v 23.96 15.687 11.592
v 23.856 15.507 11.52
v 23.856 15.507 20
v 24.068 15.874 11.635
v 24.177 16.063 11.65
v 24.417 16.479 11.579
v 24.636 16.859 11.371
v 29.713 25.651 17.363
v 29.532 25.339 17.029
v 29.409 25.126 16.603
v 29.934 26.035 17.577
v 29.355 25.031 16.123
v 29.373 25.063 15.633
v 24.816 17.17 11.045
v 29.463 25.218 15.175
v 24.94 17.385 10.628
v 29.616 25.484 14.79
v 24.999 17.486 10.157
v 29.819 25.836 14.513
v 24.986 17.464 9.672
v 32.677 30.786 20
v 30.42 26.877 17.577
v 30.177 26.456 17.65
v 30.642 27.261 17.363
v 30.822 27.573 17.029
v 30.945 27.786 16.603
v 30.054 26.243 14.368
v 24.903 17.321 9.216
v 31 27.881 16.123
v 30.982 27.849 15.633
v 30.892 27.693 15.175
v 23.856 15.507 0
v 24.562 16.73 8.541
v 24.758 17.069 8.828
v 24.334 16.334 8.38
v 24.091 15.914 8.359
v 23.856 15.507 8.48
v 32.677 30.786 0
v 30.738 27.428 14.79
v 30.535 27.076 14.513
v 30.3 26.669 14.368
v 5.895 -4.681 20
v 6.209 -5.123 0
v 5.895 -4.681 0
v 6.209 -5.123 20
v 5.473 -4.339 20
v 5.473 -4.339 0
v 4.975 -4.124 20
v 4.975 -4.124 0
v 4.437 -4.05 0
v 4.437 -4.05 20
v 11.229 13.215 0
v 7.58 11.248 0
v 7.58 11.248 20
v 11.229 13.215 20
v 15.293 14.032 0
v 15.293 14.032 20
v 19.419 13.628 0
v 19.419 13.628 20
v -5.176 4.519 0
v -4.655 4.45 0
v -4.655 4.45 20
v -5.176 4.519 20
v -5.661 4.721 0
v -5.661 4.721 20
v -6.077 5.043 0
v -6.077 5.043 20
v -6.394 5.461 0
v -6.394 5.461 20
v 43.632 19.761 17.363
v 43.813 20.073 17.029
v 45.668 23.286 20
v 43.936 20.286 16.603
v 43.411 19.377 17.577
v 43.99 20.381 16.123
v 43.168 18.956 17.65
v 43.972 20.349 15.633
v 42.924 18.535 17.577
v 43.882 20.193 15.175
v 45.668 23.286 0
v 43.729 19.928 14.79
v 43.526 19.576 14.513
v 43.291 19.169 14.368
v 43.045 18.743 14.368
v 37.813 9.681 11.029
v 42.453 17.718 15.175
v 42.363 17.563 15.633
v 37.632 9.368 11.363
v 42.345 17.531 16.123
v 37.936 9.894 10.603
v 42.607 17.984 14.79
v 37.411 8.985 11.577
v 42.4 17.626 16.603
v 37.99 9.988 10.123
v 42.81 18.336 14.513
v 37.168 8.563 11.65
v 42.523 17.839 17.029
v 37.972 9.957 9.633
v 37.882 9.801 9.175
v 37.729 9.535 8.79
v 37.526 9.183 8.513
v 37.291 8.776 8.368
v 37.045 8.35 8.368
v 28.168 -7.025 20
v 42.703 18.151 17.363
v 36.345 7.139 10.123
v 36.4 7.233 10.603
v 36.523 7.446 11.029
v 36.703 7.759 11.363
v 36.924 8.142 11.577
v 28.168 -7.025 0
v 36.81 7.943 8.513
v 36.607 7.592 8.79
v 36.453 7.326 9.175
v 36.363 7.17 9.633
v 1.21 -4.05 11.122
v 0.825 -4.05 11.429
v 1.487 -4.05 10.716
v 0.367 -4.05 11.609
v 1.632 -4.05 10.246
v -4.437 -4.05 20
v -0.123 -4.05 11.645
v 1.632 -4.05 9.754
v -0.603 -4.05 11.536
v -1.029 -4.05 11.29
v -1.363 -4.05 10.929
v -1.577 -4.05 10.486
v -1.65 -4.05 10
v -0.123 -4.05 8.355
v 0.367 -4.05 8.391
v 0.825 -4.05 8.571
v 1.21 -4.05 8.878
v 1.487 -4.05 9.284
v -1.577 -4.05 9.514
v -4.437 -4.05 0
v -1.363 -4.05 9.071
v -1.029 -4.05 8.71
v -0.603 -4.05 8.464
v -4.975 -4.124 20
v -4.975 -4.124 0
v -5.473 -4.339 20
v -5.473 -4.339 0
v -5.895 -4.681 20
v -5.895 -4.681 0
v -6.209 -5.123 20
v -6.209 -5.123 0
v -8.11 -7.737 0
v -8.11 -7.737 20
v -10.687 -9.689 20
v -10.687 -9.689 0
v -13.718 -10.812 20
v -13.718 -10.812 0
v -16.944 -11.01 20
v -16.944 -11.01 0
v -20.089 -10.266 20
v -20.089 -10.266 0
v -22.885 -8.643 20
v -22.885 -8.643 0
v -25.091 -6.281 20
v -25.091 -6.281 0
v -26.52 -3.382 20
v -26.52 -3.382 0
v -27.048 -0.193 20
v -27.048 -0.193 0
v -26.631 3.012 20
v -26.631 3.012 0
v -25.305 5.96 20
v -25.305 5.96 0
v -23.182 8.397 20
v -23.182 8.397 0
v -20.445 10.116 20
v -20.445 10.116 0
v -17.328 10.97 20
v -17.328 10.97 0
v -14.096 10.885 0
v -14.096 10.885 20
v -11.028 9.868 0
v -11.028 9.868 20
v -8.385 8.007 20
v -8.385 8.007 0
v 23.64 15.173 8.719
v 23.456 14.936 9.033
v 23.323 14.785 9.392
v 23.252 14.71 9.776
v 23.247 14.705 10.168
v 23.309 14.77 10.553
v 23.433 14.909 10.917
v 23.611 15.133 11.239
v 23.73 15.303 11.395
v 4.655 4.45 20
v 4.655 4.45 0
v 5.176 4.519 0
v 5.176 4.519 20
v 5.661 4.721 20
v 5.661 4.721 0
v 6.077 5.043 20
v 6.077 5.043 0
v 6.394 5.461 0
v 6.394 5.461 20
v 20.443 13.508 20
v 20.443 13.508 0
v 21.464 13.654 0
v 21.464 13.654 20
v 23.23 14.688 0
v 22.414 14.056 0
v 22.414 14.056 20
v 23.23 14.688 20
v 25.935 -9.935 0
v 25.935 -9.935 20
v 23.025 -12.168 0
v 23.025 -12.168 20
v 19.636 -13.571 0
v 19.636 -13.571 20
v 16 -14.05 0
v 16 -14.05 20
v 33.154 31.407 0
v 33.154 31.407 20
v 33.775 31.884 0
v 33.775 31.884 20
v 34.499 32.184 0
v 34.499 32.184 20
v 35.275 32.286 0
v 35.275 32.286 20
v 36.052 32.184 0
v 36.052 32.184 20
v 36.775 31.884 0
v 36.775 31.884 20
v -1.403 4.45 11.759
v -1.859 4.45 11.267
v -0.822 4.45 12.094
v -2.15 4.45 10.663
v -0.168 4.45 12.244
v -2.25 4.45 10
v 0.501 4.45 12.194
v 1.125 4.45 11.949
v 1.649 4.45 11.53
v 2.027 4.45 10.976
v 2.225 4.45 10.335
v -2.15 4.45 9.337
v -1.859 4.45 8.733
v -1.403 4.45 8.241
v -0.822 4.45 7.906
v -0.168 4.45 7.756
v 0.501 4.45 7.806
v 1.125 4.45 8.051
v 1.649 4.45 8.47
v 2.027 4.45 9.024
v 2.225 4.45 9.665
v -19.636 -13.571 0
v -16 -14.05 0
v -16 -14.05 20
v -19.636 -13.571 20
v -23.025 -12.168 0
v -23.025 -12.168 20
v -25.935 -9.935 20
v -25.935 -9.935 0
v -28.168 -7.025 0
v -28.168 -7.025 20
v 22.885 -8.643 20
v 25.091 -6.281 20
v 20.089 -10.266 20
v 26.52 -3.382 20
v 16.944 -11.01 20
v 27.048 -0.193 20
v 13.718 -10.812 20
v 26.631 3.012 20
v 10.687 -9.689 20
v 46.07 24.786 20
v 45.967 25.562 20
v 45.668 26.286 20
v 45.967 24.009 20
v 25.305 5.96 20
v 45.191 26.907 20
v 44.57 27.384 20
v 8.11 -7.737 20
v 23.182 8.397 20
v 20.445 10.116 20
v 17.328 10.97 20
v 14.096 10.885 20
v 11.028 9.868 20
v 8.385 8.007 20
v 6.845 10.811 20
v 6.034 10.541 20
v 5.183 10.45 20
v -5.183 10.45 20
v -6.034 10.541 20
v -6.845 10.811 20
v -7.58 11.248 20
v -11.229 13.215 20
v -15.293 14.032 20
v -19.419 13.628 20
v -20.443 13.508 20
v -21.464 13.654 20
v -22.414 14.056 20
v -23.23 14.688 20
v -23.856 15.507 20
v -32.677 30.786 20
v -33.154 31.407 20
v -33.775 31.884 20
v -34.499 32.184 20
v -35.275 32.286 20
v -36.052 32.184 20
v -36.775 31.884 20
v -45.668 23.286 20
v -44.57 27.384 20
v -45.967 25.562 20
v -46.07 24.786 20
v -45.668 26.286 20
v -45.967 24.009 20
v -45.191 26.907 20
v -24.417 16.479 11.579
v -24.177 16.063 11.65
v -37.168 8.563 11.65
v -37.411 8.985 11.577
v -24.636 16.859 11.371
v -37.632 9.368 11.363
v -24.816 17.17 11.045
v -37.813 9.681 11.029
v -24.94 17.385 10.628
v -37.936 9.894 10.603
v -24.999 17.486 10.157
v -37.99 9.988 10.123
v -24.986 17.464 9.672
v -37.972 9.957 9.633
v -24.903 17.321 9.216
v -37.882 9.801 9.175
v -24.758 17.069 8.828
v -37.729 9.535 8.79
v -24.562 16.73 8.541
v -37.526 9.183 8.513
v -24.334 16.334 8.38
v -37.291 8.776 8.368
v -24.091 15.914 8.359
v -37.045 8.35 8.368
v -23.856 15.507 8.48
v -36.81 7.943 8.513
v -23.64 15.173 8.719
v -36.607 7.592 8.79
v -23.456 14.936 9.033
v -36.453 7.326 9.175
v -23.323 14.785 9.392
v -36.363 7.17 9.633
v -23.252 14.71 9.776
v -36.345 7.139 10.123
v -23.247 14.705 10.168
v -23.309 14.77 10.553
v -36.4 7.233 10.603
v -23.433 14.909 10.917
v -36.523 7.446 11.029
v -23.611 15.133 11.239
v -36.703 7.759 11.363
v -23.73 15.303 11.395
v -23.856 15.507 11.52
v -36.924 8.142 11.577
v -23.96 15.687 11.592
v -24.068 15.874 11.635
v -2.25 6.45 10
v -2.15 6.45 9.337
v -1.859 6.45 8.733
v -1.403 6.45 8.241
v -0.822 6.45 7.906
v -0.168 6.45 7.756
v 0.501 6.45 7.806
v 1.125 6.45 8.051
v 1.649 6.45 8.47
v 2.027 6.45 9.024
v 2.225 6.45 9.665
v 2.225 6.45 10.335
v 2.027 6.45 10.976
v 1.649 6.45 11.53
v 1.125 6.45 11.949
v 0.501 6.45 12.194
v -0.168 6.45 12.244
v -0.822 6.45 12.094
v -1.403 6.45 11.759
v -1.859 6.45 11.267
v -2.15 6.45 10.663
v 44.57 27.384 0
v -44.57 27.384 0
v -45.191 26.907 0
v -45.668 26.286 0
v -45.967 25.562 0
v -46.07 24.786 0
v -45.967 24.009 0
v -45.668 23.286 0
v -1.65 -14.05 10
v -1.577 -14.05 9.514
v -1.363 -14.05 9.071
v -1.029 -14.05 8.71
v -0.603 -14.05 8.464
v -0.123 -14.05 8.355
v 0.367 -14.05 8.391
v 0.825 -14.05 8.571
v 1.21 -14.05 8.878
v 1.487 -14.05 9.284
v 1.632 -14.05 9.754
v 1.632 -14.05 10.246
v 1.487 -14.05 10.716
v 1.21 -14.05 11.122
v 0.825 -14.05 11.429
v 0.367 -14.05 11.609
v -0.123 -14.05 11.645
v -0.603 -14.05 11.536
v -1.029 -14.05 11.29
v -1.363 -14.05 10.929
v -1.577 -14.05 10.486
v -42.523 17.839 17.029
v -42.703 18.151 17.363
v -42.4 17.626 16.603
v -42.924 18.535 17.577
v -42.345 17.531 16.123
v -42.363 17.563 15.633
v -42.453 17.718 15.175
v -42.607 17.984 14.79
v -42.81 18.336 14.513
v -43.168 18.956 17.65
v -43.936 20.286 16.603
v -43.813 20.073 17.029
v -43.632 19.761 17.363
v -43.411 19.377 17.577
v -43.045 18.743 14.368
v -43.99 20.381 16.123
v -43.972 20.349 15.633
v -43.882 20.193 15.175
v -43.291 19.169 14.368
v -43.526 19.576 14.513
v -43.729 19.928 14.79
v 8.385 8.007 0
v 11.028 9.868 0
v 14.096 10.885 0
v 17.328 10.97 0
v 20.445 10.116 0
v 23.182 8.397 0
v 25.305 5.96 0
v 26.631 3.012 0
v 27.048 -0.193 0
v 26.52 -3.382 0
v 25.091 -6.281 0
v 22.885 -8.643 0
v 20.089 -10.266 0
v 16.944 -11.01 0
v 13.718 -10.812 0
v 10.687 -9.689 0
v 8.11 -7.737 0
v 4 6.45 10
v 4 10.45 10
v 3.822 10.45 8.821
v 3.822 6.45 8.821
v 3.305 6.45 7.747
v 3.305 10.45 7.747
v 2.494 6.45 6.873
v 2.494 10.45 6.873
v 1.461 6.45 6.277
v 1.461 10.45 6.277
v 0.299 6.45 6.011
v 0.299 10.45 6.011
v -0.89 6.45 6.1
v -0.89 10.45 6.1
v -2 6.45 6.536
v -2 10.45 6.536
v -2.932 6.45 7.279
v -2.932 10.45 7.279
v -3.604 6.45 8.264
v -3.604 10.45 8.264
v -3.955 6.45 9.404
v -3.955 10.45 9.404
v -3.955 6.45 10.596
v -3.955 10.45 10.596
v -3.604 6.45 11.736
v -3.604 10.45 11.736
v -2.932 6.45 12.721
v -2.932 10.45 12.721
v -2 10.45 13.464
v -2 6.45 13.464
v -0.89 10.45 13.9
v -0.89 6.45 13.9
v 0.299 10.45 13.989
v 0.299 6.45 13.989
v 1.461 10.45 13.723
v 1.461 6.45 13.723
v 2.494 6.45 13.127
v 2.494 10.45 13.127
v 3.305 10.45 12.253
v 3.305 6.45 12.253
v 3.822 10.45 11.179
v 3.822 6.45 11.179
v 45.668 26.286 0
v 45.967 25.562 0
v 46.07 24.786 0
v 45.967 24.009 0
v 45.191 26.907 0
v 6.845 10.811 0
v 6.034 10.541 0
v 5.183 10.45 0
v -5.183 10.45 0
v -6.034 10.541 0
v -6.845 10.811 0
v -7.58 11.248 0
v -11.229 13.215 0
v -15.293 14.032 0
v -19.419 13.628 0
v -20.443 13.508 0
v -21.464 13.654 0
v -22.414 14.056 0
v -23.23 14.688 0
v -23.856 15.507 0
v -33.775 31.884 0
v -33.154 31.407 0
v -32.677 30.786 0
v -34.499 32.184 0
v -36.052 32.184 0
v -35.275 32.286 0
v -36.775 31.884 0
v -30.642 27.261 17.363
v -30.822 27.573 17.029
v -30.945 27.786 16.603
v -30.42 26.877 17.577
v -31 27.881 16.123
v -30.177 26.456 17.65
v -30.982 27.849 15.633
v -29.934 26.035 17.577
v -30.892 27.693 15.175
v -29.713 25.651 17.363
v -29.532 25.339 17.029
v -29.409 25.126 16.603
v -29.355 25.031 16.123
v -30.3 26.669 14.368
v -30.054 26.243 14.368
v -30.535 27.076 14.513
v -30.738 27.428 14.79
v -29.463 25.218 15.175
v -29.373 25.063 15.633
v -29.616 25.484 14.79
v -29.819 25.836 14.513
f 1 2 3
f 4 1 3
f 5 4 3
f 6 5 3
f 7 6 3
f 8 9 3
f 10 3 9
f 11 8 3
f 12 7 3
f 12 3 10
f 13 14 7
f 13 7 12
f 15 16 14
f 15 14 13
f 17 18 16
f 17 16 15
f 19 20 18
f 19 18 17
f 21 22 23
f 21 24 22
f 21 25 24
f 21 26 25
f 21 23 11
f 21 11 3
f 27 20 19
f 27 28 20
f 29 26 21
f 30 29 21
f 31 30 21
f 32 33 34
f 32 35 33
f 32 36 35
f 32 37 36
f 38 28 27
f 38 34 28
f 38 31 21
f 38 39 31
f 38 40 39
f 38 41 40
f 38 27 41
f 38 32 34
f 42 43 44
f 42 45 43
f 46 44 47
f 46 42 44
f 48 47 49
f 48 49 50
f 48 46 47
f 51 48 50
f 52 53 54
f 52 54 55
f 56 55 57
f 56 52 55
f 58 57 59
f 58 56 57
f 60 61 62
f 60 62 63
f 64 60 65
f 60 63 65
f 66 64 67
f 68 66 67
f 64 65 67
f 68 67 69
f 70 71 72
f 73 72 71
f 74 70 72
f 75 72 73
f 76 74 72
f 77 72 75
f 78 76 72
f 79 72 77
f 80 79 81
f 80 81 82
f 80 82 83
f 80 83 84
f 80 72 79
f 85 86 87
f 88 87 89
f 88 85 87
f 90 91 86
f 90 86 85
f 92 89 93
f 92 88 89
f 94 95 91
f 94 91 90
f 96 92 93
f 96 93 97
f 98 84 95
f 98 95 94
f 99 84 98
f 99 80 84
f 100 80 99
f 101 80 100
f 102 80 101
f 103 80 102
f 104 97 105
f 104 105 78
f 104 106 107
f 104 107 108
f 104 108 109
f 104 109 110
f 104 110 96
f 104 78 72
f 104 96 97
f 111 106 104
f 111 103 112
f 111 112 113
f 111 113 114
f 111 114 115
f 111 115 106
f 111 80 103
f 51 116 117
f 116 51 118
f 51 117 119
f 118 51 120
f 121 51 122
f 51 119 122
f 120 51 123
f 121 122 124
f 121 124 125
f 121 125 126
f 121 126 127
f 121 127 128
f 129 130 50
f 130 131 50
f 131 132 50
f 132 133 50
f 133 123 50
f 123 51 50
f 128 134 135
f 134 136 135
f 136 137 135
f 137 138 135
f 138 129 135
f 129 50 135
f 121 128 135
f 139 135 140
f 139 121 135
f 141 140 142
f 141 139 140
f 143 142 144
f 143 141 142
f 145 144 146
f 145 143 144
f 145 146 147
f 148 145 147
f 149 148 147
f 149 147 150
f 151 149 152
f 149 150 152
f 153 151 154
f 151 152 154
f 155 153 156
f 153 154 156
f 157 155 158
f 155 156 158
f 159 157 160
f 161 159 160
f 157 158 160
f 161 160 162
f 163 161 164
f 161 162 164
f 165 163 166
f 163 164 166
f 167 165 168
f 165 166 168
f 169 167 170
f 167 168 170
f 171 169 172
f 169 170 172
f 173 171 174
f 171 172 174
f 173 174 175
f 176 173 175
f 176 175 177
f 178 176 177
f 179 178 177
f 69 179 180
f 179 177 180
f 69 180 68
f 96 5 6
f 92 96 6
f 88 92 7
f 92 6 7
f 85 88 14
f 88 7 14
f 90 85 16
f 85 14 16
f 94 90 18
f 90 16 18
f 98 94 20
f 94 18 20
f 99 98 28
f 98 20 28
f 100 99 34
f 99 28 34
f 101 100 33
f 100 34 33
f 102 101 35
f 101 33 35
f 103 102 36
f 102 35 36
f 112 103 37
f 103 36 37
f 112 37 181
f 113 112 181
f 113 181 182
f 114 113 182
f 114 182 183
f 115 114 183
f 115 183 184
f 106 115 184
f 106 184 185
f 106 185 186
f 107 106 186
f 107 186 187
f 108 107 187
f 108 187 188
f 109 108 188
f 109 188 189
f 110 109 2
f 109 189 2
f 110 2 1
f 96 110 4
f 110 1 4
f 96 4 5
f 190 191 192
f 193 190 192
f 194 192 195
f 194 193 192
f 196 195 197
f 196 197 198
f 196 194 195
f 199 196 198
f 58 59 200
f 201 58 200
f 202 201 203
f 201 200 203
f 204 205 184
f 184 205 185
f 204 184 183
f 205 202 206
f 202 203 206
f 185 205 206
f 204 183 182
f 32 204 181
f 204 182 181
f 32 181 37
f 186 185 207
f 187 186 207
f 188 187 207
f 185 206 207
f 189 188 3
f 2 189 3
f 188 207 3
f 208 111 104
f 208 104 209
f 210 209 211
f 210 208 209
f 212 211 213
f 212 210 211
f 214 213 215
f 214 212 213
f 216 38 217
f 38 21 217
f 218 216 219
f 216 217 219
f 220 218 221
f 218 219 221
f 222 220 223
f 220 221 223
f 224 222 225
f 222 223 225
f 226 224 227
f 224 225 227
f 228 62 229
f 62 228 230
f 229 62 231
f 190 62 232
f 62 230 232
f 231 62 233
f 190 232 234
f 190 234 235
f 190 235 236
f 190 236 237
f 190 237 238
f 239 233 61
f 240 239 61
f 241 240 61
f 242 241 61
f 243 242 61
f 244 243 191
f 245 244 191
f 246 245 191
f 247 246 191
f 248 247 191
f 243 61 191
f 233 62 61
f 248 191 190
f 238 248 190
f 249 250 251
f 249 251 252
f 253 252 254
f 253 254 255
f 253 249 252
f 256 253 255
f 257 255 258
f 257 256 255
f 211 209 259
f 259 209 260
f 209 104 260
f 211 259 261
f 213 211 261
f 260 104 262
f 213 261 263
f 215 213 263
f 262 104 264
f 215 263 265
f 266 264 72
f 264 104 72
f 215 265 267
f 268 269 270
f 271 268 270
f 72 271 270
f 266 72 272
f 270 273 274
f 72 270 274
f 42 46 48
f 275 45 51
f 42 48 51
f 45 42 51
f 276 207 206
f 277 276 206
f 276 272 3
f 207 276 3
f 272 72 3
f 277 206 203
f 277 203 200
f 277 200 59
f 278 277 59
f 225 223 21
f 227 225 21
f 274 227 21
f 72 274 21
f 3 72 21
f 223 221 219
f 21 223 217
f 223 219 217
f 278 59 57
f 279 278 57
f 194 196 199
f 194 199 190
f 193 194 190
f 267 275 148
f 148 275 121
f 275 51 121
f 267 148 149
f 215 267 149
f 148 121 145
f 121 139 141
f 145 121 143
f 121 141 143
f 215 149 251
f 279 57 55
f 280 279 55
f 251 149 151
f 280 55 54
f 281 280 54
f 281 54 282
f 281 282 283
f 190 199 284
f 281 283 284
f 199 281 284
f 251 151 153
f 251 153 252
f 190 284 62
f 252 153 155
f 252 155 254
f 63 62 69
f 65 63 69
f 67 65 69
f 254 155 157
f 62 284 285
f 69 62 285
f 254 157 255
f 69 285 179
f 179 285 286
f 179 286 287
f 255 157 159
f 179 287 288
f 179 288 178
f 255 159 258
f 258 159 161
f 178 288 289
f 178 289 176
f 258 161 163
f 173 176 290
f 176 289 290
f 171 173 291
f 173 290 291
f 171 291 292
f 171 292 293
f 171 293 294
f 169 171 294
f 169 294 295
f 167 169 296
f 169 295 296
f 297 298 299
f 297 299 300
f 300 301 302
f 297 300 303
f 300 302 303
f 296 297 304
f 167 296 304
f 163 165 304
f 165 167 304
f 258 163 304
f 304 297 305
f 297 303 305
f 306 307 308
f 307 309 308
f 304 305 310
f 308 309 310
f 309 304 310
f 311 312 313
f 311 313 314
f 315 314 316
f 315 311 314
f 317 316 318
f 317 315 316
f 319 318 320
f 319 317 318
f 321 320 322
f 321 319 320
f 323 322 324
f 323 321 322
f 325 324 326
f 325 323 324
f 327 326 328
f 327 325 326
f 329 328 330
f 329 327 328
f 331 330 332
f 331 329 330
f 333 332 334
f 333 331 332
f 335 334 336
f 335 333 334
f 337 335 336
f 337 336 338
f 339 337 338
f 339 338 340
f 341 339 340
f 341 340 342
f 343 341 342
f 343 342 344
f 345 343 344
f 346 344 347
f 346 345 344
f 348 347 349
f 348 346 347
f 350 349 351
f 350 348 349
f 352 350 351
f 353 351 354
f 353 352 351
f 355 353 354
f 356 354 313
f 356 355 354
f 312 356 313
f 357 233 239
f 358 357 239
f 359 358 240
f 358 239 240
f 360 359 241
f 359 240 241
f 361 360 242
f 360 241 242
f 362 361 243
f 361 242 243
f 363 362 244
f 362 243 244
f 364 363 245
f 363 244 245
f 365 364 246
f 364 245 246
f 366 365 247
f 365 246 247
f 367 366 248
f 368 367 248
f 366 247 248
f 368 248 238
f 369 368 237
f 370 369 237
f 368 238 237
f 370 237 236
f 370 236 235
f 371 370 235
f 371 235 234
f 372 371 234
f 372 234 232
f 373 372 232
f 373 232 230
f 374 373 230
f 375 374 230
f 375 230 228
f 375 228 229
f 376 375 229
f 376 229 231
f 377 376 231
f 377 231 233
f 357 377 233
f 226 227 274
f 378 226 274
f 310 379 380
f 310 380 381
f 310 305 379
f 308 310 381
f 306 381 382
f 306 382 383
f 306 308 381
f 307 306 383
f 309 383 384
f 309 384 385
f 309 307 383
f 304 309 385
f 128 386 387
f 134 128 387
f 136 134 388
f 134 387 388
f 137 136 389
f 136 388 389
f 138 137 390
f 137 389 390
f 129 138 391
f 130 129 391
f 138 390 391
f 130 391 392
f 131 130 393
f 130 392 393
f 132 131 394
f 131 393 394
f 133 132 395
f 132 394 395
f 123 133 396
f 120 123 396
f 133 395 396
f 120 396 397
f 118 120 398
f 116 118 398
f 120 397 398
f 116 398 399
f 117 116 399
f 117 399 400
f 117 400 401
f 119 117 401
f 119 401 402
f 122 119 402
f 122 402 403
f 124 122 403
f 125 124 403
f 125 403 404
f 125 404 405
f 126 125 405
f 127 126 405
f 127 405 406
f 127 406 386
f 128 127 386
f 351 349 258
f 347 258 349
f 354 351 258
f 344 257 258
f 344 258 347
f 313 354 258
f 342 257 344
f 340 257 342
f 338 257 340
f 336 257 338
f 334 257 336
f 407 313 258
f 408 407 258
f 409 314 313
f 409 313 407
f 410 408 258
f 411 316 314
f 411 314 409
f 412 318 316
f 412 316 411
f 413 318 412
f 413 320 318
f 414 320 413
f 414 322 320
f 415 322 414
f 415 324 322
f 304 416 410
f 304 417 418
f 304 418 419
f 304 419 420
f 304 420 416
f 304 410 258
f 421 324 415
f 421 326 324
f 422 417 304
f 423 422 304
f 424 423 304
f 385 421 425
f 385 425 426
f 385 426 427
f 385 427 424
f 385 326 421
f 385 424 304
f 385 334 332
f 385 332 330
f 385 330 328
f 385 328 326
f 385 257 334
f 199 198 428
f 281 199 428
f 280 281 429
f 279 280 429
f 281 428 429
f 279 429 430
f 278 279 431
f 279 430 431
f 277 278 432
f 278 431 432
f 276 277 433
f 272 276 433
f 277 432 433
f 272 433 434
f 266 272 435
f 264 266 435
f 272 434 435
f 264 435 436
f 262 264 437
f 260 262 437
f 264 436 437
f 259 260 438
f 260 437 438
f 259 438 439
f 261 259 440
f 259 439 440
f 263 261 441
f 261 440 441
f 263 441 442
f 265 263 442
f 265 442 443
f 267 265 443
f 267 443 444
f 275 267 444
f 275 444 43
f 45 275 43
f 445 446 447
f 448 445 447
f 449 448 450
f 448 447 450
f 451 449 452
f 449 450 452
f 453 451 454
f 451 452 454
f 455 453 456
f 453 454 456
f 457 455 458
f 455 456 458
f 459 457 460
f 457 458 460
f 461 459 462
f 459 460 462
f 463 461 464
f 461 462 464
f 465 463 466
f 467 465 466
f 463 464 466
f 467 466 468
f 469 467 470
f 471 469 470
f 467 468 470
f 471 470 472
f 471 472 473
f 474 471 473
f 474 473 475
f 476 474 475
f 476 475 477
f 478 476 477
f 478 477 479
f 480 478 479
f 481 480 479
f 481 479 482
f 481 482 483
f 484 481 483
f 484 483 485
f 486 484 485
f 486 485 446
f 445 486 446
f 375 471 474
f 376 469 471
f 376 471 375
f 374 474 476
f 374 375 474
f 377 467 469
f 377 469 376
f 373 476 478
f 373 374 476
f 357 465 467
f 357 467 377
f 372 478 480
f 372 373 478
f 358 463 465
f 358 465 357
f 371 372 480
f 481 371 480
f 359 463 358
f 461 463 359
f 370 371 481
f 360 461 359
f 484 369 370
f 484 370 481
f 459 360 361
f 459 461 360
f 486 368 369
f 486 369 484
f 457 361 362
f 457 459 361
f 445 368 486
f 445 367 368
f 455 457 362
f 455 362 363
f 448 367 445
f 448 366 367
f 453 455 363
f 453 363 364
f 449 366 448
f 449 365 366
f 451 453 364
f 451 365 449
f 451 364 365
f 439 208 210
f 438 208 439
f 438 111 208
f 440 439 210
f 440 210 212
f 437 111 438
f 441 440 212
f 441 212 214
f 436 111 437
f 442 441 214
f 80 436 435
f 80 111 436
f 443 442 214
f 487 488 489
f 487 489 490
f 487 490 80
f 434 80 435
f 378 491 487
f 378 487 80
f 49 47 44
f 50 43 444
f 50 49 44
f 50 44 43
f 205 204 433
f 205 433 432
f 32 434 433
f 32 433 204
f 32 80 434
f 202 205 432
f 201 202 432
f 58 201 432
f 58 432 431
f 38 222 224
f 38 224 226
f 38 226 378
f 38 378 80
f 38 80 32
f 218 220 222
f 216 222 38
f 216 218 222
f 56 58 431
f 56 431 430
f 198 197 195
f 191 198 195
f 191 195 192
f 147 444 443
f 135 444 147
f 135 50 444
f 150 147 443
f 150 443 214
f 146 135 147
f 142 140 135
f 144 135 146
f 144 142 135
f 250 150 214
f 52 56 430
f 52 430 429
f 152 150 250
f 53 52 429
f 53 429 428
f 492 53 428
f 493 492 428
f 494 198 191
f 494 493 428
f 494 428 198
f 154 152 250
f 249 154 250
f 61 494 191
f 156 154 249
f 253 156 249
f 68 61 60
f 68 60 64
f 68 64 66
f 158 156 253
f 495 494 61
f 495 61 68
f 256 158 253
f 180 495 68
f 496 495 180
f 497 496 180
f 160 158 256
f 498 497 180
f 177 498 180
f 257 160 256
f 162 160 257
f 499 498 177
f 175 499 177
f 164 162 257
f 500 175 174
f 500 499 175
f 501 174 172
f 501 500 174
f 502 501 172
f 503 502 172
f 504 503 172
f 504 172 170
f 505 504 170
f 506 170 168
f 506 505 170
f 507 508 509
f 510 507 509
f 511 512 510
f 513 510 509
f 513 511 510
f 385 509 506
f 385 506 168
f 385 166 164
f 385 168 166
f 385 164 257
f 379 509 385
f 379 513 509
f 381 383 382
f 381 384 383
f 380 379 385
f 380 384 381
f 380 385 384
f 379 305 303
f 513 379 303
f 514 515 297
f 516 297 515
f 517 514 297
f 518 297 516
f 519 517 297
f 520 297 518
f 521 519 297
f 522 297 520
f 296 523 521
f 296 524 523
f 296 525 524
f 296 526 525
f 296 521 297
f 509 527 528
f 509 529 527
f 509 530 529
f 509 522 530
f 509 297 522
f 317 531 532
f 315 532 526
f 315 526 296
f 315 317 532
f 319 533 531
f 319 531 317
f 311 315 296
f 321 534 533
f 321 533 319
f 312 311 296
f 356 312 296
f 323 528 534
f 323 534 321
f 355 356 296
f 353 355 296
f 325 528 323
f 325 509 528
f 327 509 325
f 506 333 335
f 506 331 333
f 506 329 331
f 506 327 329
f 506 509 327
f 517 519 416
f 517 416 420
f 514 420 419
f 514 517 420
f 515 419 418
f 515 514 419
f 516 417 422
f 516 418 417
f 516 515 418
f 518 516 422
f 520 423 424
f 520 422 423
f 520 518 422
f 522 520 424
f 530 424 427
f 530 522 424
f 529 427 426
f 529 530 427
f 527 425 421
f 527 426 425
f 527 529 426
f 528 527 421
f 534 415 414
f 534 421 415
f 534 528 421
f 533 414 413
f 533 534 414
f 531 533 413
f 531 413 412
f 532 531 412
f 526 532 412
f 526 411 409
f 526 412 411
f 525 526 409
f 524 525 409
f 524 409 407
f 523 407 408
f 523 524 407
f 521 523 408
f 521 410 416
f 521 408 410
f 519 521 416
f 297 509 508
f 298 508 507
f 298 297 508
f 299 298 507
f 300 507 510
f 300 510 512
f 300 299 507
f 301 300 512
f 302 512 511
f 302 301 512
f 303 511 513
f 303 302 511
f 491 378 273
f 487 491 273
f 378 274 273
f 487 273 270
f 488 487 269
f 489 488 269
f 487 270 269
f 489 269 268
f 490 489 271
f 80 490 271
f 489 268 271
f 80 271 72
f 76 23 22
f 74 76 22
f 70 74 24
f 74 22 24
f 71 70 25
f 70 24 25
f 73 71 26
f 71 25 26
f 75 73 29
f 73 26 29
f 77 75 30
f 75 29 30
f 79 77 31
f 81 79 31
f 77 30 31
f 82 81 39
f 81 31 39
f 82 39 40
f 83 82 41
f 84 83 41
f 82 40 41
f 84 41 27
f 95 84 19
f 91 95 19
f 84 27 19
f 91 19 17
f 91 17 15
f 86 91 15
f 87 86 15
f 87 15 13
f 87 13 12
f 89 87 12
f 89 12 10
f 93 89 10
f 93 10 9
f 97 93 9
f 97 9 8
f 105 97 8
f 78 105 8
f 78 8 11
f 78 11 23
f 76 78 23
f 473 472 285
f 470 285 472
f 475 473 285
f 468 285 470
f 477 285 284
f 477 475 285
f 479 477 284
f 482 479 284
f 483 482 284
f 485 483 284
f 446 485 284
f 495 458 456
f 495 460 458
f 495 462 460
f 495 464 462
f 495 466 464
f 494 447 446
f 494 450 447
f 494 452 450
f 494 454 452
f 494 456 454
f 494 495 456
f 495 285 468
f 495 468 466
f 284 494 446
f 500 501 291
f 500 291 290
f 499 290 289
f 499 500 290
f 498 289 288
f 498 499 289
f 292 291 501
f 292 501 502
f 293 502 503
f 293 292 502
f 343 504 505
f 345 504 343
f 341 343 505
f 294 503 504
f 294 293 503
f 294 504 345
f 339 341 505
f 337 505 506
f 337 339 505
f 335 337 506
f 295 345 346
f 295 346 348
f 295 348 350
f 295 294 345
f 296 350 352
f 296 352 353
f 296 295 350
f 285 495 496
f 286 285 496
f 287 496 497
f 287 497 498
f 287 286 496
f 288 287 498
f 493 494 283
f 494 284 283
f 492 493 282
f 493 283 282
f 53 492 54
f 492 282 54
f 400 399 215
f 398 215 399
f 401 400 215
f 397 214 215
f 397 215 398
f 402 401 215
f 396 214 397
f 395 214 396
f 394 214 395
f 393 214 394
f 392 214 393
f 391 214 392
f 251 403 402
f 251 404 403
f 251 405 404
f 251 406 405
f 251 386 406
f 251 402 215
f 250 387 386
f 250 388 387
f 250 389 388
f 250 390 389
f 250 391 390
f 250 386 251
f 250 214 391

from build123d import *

# Parameters (mm, degrees)
EXTRUDE_2_DEPTH             = 20
HOLE_WIZARD_M41_D           = 4.5
HOLE_WIZARD_M41_DEPTH       = 6
HOLE_WIZARD_M41_CBORE_D     = 8
HOLE_WIZARD_M41_CBORE_DEPTH = 4
M4X0_71_D                   = 3.3
FILLET_1_R                  = 2
FILLET_2_R                  = 4
M4X0_72_D                   = 3.3
FILLET_3_R                  = 3


with BuildPart() as part:
    # Эскиз1 → Бобышка-Вытянуть2 (new body)
    with BuildSketch(Plane.XY):
        with BuildLine():
            Line((-6.608514495, 10.45), (6.608514495, 10.45))
            ThreePointArc((6.608514495, 10.45), (14.066074726, 13.916265053), (22.186198751, 12.614810542))
            Line((22.186198751, 12.614810542), (34.177275866, 33.383965344))
            Line((34.177275866, 33.383965344), (47.167656923, 25.883965344))
            Line((47.167656923, 25.883965344), (28.167656923, -7.025))
            ThreePointArc((28.167656923, -7.025), (23.025, -12.167656923), (16, -14.05))
            Line((16, -14.05), (-16, -14.05))
            ThreePointArc((-16, -14.05), (-23.025, -12.167656923), (-28.167656923, -7.025))
            Line((-28.167656923, -7.025), (-47.167656923, 25.883965344))
            Line((-47.167656923, 25.883965344), (-34.177275866, 33.383965344))
            Line((-34.177275866, 33.383965344), (-22.186198751, 12.614810542))
            ThreePointArc((-22.186198751, 12.614810542), (-14.066074726, 13.916265053), (-6.608514495, 10.45))
        make_face()
        with BuildLine():
            Line((-5.885653753, 4.45), (5.885653753, 4.45))
            ThreePointArc((5.885653753, 4.45), (27.047875471, -0.216673901), (5.71894947, -4.05))
            Line((5.71894947, -4.05), (-5.71894947, -4.05))
            ThreePointArc((-5.71894947, -4.05), (-27.047875471, -0.216673901), (-5.885653753, 4.45))
        make_face(mode=Mode.SUBTRACT)
    extrude(amount=EXTRUDE_2_DEPTH)

    # Цековка для винта с внутренним шестигранником M41
    with Locations(Plane(origin=(0, 10.45, 0), x_dir=(1, 0, 0), z_dir=(0, 1, 0))):
        with Locations((0, -10)):
            CounterBoreHole(HOLE_WIZARD_M41_D / 2, HOLE_WIZARD_M41_CBORE_D / 2, HOLE_WIZARD_M41_CBORE_DEPTH, depth=HOLE_WIZARD_M41_DEPTH)

    # Отверстие обработанное метчиком M4x0.71 (through all)
    with Locations(Plane(origin=(0, -4.05, 0), x_dir=(1, 0, 0), z_dir=(0, 1, 0))):
        with Locations((0, -10)):
            Hole(M4X0_71_D / 2)

    # Скругление1
    fillet_1_edges = [part.edges().sort_by_distance(p)[0] for p in [
        (-5.885653753, 4.45, 10),
        (-5.71894947, -4.05, 10),
        (5.71894947, -4.05, 10),
        (5.885653753, 4.45, 10),
    ]]
    fillet(fillet_1_edges, radius=FILLET_1_R)

    # Скругление2
    fillet_2_edges = [part.edges().sort_by_distance(p)[0] for p in [
        (-6.608514495, 10.45, 10),
        (6.608514495, 10.45, 10),
        (22.186198751, 12.614810542, 10),
        (-22.186198751, 12.614810542, 10),
    ]]
    fillet(fillet_2_edges, radius=FILLET_2_R)

    # Отверстие обработанное метчиком M4x0.72 (through all)
    with Locations(Plane(origin=(24.167656923, -13.95320323, 0), x_dir=(0, 0, -1), z_dir=(0.866025404, -0.5, 0))):
        with Locations((-10, 26), (-16, 38)):
            m4x0_72 = Hole(M4X0_72_D / 2)

    # Зеркальное отражение1: Отверстие обработанное метчиком M4x0.72 across plane
    add(m4x0_72.mirror(Plane(origin=(0, 0, 0), x_dir=(0, 0, 1), z_dir=(1, 0, 0))), mode=Mode.SUBTRACT)

    # Скругление3
    fillet_3_edges = [part.edges().sort_by_distance(p)[0] for p in [
        (34.177275866, 33.383965344, 10),
        (47.167656923, 25.883965344, 10),
        (-47.167656923, 25.883965344, 10),
        (-34.177275866, 33.383965344, 10),
    ]]
    fillet(fillet_3_edges, radius=FILLET_3_R)


solid = part.part
